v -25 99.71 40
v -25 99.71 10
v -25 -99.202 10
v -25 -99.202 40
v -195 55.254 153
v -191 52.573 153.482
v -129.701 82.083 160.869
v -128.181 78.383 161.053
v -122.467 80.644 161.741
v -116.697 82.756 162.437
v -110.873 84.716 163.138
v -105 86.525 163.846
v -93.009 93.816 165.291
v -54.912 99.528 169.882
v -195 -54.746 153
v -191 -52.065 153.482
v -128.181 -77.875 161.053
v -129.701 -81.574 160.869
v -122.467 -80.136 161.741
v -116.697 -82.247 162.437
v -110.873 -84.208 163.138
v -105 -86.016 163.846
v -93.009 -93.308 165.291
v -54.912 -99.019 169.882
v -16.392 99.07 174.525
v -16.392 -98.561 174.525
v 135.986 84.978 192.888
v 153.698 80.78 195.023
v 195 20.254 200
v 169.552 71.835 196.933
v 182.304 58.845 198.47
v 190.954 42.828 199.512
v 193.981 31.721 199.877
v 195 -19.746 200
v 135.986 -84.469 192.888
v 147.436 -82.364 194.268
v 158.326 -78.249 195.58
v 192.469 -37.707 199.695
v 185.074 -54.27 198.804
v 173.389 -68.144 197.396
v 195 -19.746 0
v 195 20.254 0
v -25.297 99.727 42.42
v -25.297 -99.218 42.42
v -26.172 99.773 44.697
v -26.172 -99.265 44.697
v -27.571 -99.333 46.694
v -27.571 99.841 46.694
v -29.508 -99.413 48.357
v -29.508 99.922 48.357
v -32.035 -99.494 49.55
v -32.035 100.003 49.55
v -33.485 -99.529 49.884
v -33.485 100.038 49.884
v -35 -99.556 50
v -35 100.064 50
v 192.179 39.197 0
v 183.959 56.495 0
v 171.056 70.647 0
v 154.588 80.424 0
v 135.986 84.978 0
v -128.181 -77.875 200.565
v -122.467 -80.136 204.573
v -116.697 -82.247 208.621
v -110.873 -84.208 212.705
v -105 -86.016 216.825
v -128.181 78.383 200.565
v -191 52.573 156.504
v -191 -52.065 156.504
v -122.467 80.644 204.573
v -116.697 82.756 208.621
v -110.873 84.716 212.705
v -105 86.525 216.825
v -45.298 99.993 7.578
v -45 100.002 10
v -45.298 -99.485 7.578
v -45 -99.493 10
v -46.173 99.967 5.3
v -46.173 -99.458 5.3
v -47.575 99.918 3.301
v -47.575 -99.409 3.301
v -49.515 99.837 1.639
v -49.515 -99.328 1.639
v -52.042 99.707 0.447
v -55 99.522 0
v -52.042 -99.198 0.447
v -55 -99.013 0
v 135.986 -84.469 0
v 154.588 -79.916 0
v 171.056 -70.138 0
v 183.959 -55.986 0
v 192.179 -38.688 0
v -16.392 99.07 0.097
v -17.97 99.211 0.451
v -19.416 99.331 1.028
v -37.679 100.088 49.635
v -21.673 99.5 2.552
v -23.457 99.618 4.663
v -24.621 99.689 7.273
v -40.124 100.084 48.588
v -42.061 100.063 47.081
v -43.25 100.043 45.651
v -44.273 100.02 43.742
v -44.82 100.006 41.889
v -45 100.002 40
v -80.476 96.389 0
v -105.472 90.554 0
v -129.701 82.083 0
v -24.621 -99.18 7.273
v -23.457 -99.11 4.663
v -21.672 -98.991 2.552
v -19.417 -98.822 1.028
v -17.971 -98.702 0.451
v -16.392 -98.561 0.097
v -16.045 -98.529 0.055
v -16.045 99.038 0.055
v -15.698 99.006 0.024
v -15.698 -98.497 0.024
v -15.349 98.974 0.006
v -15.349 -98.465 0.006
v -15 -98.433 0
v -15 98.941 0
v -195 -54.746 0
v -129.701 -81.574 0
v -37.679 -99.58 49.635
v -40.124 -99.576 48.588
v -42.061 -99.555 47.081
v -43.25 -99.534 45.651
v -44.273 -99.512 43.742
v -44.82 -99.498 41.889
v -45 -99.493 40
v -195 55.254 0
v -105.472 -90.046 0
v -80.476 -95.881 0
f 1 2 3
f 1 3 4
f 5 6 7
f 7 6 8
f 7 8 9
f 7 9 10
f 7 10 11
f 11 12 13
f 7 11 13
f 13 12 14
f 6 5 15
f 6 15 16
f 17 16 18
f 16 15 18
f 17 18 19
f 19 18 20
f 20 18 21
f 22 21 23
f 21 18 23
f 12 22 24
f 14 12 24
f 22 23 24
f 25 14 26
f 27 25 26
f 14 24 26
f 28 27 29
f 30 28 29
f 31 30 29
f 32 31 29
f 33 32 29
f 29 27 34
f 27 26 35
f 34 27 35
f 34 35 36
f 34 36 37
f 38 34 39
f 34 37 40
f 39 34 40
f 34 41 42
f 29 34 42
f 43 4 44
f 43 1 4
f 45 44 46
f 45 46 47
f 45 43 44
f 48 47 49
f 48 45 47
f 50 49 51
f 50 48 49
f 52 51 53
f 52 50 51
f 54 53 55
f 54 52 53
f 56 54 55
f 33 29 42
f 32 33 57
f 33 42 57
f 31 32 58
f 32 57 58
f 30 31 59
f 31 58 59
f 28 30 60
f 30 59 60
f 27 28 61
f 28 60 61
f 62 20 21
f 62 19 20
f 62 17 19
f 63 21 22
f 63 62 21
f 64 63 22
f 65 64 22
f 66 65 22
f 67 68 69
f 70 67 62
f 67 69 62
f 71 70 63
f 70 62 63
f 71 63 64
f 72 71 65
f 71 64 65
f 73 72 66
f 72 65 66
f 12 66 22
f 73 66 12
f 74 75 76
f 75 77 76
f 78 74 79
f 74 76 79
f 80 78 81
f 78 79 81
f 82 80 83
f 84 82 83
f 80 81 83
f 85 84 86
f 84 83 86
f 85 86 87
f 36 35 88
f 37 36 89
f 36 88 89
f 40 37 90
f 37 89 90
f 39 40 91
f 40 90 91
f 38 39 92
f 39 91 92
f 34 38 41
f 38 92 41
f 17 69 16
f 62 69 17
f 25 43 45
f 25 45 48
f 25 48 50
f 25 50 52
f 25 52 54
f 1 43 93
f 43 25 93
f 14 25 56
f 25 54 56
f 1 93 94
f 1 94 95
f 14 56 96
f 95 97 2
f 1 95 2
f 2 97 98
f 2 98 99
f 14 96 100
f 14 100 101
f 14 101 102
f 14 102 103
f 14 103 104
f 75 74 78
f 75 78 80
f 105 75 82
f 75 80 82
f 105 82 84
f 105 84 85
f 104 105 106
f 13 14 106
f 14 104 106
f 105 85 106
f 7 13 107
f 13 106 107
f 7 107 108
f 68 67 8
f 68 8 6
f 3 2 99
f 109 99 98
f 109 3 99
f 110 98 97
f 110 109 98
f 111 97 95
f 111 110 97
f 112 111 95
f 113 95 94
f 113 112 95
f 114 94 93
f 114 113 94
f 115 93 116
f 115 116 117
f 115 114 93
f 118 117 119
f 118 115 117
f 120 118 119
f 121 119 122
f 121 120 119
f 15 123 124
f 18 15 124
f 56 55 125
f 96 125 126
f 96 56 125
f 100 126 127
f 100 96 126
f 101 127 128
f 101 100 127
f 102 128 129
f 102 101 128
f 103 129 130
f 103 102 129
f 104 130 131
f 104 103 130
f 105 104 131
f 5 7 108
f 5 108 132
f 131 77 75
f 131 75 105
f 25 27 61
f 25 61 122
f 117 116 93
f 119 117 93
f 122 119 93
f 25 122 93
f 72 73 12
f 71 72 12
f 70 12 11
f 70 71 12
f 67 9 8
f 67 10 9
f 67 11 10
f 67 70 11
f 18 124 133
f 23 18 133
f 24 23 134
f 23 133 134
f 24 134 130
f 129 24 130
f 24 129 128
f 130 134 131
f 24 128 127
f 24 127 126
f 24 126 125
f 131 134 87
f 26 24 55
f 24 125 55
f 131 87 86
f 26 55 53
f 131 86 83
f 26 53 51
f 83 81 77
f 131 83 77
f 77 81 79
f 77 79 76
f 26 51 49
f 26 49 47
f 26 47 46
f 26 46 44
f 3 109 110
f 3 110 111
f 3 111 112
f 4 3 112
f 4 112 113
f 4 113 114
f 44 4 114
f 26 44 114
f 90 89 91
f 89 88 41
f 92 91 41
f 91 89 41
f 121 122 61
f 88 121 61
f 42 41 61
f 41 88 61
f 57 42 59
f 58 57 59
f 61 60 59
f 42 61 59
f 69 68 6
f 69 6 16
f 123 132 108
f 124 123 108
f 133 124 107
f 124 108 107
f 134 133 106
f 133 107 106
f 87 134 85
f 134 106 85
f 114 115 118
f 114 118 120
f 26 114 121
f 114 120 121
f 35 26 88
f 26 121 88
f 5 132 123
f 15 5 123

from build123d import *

# Parameters (mm, degrees)
F1_DEPTH  = 200
F4_DEPTH  = 110
F5_W      = 20
F5_H      = 50
F6_DEPTH  = 110
F7_R      = 10
F7_R_2    = 9.99999
F8_R      = 10
F12_DEPTH = 100


# Not quite as in the source:
# - a fillet or chamfer is up to 0.001 mm smaller than in the source, because OpenCascade refuses the exact size


with BuildPart() as f1:
    # F0 (on Top) → F1 (new body)
    with BuildSketch(Plane.XY):
        with BuildLine():
            Line((-129.7011448747, 82.0831308431), (-195, 55.2543373544))
            Line((-195, 55.2543373544), (-195, 0.2543373544))
            Line((-195, 0.2543373544), (195, 0.2543373544))
            Line((195, 0.2543373544), (195, 20.2543373544))
            ThreePointArc((195, 20.2543373544), (178.031605372, 64.0489133357), (135.9856958342, 84.9781463073))
            Line((135.9856958342, 84.9781463073), (-16.3916033039, 99.0700883522))
            ThreePointArc((-16.3916033039, 99.0700883522), (-74.0749348766, 97.4375057422), (-129.7011448747, 82.0831308431))
        make_face()
        with BuildLine():
            Line((195, 0.2543373544), (-195, 0.2543373544))
            Line((-195, 0.2543373544), (-195, -54.7456626456))
            Line((-195, -54.7456626456), (-129.7011448747, -81.5744561343))
            ThreePointArc((-129.7011448747, -81.5744561343), (-74.0749348766, -96.9288310334), (-16.3916033039, -98.5614136434))
            Line((-16.3916033039, -98.5614136434), (135.9856958342, -84.4694715986))
            ThreePointArc((135.9856958342, -84.4694715986), (178.031605372, -63.540238627), (195, -19.7456626456))
            Line((195, -19.7456626456), (195, 0.2543373544))
        make_face()
    extrude(amount=F1_DEPTH)

    # F3 (on Front) → F4 (cut, symmetric)
    with BuildSketch(Plane.XZ):
        Polygon((195, 200), (-195, 200), (-195, 153), align=None)
    extrude(amount=F4_DEPTH, both=True, mode=Mode.SUBTRACT)

    # F5 (on Front) → F6 (cut, symmetric)
    with BuildSketch(Plane.XZ):
        with Locations((-35, 25)):
            Rectangle(F5_W, F5_H)
    extrude(amount=F6_DEPTH, both=True, mode=Mode.SUBTRACT)

    # F7 (call 1 of 2: OpenCascade refuses the feature's edges together)
    f7_edges = [f1.edges().sort_by_distance(p)[0] for p in [
        (-25, 0.254337, 50),
    ]]
    fillet(f7_edges, radius=F7_R)

    # F7#2 (call 2 of 2) (radius 10 in the source; OpenCascade refuses exactly that, so slightly less here)
    f7_2_edges = [f1.edges().sort_by_distance(p)[0] for p in [
        (-45, 0.254337, 50),
    ]]
    fillet(f7_2_edges, radius=F7_R_2)

    # F8
    f8_edges = [f1.edges().sort_by_distance(p)[0] for p in [
        (-45, 0.254337, 0),
        (-25, 0.254337, 0),
    ]]
    fillet(f8_edges, radius=F8_R)

    # F9 (on offset) → F10 (join, up to the next surface of F1)
    with BuildSketch(Plane.XY.offset(220)):
        with BuildLine():
            Line((-105, -86.0161099703), (-105, 86.5247846791))
            ThreePointArc((-105, 86.5247846791), (-116.6965219134, 82.7558804952), (-128.181003028, 78.3832431737))
            Line((-128.181003028, 78.3832431737), (-191, 52.5733282266))
            Line((-191, 52.5733282266), (-191, -52.0646535178))
            Line((-191, -52.0646535178), (-128.181003028, -77.8745684649))
            ThreePointArc((-128.181003028, -77.8745684649), (-116.6965219134, -82.2472057865), (-105, -86.0161099703))
        make_face()
    extrude(until=Until.NEXT, dir=(0, 0, -1))

    # F11 (on Front) → F12 (cut, symmetric)
    with BuildSketch(Plane.XZ):
        Polygon((-191, 156.5037577633), (-105, 216.8246032937), (-105, 220), (-191, 220), align=None)
    extrude(amount=F12_DEPTH, both=True, mode=Mode.SUBTRACT)


solid = f1.part
